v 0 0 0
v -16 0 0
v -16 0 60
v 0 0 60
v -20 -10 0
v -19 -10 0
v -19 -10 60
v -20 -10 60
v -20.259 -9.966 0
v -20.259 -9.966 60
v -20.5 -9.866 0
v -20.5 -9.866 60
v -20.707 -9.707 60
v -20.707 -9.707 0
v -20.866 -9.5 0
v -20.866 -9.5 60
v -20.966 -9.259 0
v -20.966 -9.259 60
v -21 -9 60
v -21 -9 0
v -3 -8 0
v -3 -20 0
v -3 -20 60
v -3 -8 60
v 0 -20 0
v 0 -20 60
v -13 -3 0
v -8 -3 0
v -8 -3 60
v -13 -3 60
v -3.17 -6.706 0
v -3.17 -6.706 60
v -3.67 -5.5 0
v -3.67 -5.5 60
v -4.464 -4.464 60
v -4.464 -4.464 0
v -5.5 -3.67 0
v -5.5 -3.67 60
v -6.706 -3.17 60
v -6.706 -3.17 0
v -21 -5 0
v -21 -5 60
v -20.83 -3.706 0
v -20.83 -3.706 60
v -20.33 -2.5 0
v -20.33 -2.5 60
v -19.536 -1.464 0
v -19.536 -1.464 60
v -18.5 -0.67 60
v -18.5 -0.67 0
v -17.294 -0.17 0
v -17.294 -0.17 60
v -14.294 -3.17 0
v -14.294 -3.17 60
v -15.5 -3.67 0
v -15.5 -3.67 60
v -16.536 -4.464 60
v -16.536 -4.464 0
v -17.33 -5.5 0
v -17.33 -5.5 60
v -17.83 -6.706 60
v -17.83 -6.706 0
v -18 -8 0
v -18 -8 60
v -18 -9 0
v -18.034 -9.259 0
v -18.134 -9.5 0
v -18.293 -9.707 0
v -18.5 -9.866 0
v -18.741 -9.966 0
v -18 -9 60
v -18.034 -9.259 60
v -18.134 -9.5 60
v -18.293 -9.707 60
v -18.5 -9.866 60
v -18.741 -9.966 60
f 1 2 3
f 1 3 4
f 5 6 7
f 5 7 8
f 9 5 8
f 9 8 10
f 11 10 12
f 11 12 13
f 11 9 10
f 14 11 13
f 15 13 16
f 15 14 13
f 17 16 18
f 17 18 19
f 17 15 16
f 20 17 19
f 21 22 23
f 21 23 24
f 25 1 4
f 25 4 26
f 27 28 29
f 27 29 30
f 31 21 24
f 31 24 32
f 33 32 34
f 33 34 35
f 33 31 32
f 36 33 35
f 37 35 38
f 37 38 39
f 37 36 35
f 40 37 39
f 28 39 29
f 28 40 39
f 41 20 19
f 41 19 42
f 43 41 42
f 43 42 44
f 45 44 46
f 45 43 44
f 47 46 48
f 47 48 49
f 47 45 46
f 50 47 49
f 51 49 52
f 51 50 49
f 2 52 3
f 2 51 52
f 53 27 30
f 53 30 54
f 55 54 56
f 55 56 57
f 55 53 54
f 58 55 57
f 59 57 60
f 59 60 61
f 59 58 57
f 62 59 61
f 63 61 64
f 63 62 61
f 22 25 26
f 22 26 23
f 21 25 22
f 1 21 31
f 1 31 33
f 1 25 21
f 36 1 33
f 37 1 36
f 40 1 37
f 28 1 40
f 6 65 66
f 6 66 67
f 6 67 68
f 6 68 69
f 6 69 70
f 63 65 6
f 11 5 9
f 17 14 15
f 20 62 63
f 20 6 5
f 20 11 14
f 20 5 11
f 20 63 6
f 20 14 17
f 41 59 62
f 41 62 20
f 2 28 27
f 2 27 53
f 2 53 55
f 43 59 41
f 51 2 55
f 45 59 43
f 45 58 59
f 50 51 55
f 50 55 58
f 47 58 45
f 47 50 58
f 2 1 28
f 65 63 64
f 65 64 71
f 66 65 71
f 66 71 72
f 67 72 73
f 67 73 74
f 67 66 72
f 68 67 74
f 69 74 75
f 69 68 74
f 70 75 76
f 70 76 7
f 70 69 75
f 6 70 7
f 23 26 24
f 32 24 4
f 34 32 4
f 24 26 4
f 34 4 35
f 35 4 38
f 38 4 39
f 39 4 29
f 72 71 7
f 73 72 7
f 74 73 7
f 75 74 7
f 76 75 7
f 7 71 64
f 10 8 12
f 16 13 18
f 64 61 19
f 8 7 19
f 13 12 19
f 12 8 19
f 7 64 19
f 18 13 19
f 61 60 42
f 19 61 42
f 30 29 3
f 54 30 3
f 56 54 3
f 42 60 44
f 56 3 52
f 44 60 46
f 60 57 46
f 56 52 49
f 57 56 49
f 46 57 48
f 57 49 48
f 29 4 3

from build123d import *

# Parameters (mm, degrees)
BOSS_EXTRUDE1_DEPTH = 60


with BuildPart() as part:
    # Sketch1 → Boss-Extrude1 (new body)
    with BuildSketch(Plane.XY):
        with BuildLine():
            Line((0, 0), (0, -20))
            Line((0, -20), (-3, -20))
            Line((-3, -20), (-3, -8))
            ThreePointArc((-3, -8), (-4.464466094, -4.464466094), (-8, -3))
            Line((-8, -3), (-13, -3))
            ThreePointArc((-13, -3), (-16.535533906, -4.464466094), (-18, -8))
            Line((-18, -8), (-18, -9))
            ThreePointArc((-18, -9), (-18.292893219, -9.707106781), (-19, -10))
            Line((-19, -10), (-20, -10))
            ThreePointArc((-20, -10), (-20.707106781, -9.707106781), (-21, -9))
            Line((-21, -9), (-21, -5))
            ThreePointArc((-21, -5), (-19.535533906, -1.464466094), (-16, 0))
            Line((-16, 0), (0, 0))
        make_face()
    extrude(amount=BOSS_EXTRUDE1_DEPTH)


solid = part.part
